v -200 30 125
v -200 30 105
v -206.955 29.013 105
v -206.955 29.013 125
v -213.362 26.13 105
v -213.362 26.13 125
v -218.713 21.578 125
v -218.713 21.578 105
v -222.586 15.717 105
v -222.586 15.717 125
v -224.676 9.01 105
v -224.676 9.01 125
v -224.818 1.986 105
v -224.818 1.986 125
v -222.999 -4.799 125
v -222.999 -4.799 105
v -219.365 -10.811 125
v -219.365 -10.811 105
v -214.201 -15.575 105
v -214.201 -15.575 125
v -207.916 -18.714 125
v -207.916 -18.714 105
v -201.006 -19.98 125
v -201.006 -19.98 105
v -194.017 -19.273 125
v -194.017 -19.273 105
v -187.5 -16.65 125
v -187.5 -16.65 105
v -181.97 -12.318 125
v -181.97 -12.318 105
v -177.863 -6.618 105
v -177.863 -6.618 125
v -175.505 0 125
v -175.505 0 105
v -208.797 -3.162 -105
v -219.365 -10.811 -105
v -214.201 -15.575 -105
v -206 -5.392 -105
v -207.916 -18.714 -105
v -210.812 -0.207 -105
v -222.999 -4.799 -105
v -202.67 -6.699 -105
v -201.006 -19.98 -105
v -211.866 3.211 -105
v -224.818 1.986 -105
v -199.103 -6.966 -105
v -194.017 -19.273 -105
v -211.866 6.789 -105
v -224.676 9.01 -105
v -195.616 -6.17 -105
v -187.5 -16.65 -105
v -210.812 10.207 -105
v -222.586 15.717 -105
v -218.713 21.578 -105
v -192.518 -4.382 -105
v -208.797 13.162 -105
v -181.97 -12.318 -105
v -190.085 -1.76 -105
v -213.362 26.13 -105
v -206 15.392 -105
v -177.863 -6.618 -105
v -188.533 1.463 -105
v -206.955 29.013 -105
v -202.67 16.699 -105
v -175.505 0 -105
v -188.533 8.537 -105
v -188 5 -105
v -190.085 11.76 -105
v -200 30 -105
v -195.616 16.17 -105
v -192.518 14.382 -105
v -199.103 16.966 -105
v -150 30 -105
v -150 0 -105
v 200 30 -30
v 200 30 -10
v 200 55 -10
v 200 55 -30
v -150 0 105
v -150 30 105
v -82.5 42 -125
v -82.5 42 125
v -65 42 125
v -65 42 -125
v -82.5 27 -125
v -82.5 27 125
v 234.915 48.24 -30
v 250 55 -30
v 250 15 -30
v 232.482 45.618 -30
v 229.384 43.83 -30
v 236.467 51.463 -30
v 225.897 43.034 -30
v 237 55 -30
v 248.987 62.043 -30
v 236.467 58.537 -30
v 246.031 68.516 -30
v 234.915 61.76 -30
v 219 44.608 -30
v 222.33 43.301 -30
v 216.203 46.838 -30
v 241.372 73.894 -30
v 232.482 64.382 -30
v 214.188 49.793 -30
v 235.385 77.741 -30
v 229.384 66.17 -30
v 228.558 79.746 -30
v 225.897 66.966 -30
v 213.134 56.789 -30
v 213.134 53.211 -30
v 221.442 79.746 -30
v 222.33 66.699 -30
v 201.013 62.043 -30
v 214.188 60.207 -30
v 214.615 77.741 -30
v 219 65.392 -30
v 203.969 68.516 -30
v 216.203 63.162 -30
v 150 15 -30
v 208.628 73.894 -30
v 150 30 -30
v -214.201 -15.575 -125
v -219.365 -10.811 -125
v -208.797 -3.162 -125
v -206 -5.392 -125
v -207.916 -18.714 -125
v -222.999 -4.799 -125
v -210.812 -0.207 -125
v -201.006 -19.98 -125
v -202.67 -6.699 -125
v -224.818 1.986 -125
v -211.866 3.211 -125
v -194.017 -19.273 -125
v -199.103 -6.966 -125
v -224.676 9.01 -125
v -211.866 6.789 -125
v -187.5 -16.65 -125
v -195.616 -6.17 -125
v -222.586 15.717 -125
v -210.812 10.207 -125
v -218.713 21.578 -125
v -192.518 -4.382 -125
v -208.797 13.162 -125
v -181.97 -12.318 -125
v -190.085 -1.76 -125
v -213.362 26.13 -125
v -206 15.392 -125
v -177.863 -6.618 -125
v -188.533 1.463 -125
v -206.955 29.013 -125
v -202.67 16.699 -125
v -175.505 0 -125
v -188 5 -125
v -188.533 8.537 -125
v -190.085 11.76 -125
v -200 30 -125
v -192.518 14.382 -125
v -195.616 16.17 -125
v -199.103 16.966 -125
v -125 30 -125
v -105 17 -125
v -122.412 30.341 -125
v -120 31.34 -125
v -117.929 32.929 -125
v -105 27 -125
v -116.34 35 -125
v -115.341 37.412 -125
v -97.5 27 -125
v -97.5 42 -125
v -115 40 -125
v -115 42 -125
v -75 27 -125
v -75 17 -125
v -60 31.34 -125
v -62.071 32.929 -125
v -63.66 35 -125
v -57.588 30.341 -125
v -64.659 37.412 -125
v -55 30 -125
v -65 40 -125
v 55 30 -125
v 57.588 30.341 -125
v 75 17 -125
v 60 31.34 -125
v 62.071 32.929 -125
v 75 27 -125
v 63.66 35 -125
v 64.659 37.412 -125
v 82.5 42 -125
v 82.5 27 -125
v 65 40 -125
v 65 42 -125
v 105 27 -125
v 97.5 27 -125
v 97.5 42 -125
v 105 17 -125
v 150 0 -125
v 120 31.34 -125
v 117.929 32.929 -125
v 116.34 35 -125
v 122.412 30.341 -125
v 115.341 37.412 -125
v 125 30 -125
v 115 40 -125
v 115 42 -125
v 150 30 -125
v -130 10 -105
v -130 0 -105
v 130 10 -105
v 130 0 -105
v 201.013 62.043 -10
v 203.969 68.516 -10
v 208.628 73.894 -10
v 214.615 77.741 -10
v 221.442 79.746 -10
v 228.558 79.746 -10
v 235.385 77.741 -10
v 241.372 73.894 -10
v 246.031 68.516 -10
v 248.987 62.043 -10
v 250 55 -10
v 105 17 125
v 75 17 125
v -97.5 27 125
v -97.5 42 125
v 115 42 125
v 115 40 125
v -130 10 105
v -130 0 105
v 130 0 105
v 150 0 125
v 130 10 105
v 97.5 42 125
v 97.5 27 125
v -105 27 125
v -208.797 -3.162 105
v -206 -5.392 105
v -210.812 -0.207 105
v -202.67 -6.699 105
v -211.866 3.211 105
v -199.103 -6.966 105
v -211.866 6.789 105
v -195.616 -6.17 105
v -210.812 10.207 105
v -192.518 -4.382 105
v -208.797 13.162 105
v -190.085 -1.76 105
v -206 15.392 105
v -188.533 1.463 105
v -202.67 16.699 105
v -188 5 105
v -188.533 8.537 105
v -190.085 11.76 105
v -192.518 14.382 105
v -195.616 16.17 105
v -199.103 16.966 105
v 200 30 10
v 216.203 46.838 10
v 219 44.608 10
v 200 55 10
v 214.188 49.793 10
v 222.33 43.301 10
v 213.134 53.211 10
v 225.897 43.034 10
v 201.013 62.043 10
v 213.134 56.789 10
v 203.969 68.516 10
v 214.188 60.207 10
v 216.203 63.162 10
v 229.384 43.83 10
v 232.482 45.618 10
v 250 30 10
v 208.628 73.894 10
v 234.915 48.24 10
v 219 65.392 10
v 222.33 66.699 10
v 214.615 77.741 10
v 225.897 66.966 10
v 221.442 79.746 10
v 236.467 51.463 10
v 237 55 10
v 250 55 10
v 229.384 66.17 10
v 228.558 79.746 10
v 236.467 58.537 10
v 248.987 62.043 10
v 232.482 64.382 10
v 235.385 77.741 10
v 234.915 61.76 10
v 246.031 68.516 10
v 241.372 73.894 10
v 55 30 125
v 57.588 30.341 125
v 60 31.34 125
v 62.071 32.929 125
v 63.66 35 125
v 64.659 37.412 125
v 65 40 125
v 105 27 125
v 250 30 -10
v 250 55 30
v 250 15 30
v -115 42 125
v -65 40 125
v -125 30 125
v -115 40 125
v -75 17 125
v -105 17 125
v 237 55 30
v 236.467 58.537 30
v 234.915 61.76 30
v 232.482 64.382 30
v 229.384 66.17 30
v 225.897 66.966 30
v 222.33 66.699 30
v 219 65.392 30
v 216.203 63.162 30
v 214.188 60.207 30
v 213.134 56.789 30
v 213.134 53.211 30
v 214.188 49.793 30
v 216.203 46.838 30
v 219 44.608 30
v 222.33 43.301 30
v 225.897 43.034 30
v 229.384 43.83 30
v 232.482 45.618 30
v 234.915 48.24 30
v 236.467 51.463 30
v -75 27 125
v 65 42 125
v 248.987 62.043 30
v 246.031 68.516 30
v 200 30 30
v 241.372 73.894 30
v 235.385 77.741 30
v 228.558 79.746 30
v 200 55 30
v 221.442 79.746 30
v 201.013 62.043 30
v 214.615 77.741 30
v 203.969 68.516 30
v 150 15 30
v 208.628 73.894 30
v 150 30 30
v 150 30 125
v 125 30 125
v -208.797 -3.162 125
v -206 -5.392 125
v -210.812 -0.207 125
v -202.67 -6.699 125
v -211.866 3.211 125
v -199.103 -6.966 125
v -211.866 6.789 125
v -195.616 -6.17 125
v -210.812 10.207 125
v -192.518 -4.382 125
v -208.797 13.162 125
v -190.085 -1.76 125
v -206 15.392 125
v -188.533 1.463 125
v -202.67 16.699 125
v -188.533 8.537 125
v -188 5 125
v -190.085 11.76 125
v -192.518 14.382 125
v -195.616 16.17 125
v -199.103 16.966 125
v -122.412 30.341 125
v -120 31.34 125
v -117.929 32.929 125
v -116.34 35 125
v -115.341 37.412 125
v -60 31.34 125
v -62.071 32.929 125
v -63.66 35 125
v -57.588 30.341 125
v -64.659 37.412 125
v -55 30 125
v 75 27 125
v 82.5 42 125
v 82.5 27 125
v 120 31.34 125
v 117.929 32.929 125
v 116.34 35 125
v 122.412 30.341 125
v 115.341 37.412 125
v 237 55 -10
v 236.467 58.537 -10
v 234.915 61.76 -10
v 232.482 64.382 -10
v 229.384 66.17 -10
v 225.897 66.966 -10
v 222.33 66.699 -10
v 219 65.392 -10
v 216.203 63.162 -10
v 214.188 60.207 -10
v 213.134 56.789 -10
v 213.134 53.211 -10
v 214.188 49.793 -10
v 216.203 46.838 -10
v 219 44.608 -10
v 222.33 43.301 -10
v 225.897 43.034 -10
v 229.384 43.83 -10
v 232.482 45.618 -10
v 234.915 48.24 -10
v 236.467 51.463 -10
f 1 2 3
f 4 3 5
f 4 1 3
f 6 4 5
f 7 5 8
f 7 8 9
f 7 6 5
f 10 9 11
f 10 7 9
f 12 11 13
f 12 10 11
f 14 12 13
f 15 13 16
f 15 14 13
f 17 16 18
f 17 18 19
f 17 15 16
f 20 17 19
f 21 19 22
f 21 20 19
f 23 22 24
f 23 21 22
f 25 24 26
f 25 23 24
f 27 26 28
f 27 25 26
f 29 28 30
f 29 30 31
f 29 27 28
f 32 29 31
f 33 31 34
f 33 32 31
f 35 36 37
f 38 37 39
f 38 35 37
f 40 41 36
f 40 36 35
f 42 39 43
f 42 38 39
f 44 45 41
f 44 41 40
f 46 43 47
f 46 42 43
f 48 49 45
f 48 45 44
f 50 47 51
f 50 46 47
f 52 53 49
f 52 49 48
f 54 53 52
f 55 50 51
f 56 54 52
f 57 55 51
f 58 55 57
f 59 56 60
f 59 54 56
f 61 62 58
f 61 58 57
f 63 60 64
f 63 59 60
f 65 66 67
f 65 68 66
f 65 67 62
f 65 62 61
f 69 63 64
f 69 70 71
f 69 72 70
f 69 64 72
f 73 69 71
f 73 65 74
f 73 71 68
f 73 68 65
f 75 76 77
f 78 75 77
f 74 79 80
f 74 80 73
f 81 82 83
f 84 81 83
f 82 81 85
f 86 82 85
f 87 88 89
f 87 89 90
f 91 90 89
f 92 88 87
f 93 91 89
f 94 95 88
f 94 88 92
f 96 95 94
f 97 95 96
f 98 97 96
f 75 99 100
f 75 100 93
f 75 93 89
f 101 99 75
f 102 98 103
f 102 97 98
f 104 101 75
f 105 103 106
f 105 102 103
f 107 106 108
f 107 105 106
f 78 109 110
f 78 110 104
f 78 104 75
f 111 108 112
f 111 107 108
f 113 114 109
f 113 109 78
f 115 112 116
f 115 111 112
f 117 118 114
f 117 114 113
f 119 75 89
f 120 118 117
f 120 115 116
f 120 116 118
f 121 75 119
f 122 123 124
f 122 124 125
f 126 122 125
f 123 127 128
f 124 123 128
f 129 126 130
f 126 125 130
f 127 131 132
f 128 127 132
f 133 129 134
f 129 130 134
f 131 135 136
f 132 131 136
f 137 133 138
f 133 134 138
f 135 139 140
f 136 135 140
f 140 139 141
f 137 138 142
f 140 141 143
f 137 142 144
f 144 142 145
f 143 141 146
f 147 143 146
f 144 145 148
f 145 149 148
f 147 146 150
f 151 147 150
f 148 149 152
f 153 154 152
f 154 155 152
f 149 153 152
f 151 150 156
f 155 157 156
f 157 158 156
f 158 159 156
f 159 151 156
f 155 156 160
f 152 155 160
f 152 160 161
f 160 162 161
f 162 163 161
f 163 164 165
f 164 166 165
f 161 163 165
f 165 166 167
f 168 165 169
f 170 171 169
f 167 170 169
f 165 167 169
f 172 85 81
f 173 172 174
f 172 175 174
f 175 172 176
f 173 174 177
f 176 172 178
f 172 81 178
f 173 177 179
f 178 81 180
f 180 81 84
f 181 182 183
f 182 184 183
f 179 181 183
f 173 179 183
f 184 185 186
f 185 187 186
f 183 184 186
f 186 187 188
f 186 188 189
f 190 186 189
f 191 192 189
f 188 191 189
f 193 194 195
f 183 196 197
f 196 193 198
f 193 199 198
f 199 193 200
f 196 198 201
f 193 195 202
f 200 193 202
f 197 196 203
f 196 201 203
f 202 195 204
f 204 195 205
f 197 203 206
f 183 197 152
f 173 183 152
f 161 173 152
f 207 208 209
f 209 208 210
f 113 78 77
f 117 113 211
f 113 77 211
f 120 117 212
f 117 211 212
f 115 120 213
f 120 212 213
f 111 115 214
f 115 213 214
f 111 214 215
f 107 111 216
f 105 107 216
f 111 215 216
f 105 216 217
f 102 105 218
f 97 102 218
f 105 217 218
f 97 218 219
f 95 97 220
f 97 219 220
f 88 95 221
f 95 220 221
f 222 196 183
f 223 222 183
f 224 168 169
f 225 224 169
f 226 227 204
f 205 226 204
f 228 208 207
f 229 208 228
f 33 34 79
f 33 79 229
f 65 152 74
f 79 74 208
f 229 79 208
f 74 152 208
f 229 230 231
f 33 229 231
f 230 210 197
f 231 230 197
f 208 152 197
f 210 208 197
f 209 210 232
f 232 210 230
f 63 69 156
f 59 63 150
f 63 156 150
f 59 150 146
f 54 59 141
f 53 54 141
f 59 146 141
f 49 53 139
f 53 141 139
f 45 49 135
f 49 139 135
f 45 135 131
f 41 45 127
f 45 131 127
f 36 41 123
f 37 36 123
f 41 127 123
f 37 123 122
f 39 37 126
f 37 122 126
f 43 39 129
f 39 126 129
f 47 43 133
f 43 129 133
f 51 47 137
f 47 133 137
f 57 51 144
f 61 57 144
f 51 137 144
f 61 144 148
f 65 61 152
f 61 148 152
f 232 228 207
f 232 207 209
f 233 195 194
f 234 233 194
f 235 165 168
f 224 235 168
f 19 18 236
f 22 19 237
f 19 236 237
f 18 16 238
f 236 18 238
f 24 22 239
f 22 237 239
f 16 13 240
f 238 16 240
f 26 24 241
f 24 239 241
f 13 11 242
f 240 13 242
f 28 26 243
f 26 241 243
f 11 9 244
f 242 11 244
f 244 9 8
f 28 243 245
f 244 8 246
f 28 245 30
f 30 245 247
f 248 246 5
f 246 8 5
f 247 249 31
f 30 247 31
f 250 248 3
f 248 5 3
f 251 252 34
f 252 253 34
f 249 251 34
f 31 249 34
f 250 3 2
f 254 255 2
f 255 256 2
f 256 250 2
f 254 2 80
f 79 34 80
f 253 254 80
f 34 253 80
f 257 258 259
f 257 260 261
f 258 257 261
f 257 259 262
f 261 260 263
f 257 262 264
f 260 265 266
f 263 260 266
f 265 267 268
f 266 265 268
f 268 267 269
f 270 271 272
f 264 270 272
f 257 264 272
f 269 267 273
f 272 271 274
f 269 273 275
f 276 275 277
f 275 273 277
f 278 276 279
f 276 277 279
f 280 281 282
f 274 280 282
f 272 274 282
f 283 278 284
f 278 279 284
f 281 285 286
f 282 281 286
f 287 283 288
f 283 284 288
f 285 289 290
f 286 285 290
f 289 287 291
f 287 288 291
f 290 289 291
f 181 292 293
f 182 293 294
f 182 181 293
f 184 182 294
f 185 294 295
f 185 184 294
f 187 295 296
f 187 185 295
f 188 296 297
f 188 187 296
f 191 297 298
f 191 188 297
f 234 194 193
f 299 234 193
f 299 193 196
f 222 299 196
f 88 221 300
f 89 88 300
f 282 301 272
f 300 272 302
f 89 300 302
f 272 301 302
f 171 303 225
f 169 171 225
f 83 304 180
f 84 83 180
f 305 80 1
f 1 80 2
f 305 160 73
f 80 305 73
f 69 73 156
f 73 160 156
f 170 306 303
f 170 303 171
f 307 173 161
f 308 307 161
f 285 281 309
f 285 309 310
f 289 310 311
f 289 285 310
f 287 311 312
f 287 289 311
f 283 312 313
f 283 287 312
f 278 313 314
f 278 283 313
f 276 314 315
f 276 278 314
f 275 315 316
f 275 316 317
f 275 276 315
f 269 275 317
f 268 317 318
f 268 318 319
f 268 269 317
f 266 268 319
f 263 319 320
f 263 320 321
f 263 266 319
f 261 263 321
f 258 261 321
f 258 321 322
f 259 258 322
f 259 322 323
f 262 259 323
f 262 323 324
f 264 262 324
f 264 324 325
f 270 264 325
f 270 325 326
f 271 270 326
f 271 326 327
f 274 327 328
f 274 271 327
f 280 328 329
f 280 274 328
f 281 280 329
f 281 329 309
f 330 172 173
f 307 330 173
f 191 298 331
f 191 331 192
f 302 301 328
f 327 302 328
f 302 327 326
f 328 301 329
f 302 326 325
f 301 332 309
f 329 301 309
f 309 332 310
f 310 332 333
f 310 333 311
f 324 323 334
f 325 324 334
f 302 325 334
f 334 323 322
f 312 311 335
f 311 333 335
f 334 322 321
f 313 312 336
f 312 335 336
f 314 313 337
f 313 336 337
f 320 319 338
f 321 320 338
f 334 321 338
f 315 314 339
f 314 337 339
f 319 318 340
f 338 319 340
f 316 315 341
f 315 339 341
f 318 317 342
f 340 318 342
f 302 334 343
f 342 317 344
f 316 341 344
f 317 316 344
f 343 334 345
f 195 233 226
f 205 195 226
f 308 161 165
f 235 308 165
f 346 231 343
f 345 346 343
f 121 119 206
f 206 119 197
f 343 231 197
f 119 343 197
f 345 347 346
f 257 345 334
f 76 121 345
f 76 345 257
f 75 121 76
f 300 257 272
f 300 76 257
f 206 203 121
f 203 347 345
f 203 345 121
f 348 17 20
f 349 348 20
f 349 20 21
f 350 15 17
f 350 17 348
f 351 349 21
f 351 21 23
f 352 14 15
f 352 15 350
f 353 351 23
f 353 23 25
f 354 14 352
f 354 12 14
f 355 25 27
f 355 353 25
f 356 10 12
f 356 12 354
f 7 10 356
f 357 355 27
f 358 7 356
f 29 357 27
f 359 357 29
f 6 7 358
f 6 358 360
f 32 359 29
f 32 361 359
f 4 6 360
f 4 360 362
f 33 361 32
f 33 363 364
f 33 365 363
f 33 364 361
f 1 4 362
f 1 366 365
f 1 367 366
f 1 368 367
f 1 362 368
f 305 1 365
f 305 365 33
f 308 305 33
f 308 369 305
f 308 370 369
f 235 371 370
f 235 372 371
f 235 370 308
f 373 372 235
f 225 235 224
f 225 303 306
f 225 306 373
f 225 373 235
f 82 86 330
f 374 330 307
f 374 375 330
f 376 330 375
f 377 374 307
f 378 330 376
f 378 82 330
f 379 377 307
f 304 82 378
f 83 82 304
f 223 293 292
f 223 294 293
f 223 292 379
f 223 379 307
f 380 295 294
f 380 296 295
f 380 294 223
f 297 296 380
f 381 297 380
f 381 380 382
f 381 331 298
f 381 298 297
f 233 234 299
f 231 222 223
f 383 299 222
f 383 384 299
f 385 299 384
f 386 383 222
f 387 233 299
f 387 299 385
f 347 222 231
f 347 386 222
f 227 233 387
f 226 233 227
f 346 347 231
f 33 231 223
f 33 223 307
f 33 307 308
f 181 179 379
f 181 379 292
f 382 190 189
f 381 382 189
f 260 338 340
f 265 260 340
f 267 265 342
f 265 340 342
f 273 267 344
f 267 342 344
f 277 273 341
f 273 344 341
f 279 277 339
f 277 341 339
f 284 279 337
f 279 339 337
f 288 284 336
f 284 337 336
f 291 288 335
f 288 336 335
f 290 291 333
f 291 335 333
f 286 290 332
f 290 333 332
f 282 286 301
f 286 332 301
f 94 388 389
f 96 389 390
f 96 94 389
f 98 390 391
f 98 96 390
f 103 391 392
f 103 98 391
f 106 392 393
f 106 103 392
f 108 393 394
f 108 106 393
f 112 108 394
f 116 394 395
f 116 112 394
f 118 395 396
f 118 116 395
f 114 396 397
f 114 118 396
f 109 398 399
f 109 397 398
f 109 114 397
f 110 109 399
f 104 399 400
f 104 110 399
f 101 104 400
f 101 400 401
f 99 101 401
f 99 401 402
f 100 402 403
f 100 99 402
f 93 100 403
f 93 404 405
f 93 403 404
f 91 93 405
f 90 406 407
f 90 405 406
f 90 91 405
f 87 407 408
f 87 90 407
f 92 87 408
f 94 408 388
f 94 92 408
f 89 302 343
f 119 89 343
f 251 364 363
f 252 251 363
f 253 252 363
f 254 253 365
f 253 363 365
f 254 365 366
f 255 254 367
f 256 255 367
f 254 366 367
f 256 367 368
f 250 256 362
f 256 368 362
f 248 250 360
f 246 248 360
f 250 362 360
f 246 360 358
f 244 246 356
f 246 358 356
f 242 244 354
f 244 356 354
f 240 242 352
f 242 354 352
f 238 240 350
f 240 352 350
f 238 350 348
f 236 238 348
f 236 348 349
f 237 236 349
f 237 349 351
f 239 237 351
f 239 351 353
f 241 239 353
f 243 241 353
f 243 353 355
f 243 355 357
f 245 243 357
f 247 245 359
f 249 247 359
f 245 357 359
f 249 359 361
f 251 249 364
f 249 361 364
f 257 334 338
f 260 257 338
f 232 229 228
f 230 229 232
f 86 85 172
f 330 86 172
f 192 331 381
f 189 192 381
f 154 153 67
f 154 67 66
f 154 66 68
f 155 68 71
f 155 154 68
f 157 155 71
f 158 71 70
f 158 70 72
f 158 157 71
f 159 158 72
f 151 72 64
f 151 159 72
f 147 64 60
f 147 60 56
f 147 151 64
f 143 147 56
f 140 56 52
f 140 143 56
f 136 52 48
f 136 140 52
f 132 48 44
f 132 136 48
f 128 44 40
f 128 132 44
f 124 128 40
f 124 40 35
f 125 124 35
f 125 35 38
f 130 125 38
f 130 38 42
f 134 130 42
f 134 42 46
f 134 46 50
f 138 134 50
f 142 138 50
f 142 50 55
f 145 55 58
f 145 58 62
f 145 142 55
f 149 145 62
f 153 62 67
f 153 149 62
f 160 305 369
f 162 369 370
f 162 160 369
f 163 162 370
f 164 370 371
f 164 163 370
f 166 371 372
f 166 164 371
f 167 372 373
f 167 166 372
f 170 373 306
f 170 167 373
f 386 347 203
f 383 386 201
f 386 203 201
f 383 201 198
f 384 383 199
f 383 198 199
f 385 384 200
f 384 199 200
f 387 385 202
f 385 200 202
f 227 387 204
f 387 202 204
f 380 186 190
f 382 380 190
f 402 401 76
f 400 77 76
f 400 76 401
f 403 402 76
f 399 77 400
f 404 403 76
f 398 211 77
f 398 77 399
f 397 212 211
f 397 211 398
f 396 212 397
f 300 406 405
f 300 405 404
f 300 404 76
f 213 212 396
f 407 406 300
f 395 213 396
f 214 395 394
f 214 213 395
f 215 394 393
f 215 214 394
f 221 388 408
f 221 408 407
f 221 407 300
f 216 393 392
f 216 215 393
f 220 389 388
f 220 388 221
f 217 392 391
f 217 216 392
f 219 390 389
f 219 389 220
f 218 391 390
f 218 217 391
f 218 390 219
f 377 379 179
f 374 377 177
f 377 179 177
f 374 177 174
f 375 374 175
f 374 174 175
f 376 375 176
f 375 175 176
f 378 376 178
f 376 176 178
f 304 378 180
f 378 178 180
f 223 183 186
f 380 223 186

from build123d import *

# Parameters (mm, degrees)
ESBO_O1_W                         = 300
ESBO_O1_H                         = 250
RESSALTO_EXTRUS_O1_DEPTH          = 30
ESBO_O3_W                         = 50
ESBO_O3_H                         = 250
RESSALTO_EXTRUS_O2_DEPTH          = 12
FILETE1_R                         = 10
CORTE_EXTRUS_O1_REACH             = 127
CORTE_EXTRUS_O1_DIRECTION_2_REACH = 127
ESBO_O5_R                         = 12
RESSALTO_EXTRUS_O3_DEPTH          = 30
ESBO_O6_W                         = 60.214883571
ESBO_O6_H                         = 66.59752961
CORTE_EXTRUS_O2_DEPTH             = 10
ESBO_O7_R                         = 12
RESSALTO_EXTRUS_O4_DEPTH          = 20
ESBO_O8_W                         = 260
ESBO_O8_H                         = 210
CORTE_EXTRUS_O3_DEPTH             = 10


with BuildPart() as part:
    # Esboço1 → Ressalto-extrusão1 (new body)
    with BuildSketch(Plane(origin=(0, 0, 0), x_dir=(1, 0, 0), z_dir=(0, 1, 0))):
        Rectangle(ESBO_O1_W, ESBO_O1_H)
    extrude(amount=RESSALTO_EXTRUS_O1_DEPTH)

    # Esboço3 → Ressalto-extrusão2 (add)
    with BuildSketch(Plane(origin=(0, 30, 0), x_dir=(1, 0, 0), z_dir=(0, 1, 0))):
        with Locations((90, 0)):
            Rectangle(ESBO_O3_W, ESBO_O3_H)
        with Locations((-90, 0)):
            Rectangle(ESBO_O3_W, ESBO_O3_H)
    extrude(amount=RESSALTO_EXTRUS_O2_DEPTH)

    # Filete1
    filete1_edges = [part.edges().sort_by_distance(p)[0] for p in [
        (-115, 30, 0),
        (-65, 30, 0),
        (65, 30, 0),
        (115, 30, 0),
    ]]
    fillet(filete1_edges, radius=FILETE1_R)

    # Esboço4 → Corte-extrusão1 (cut, up to next)
    with BuildSketch(Plane.XY, mode=Mode.PRIVATE) as corte_extrus_o1_sk1:
        Polygon((82.5, 42), (97.5, 42), (97.5, 27), (105, 27), (105, 17), (75, 17), (75, 27), (82.5, 27), align=None)
    corte_extrus_o1_tool1 = extrude(corte_extrus_o1_sk1.sketch, amount=-CORTE_EXTRUS_O1_REACH, mode=Mode.PRIVATE) & part.part
    add(corte_extrus_o1_tool1.solids().sort_by_distance((90, 27.357143, 0))[0], mode=Mode.SUBTRACT)
    # Esboço4 → Corte-extrusão1 (cut, up to next)
    with BuildSketch(Plane.XY, mode=Mode.PRIVATE) as corte_extrus_o1_sk2:
        Polygon((-82.5, 42), (-82.5, 27), (-75, 27), (-75, 17), (-105, 17), (-105, 27), (-97.5, 27), (-97.5, 42), align=None)
    corte_extrus_o1_tool2 = extrude(corte_extrus_o1_sk2.sketch, amount=-CORTE_EXTRUS_O1_REACH, mode=Mode.PRIVATE) & part.part
    add(corte_extrus_o1_tool2.solids().sort_by_distance((-90, 27.357143, 0))[0], mode=Mode.SUBTRACT)

    # Esboço4 → Corte-extrusão1 direction 2 (cut, up to next)
    with BuildSketch(Plane.XY, mode=Mode.PRIVATE) as corte_extrus_o1_direction_2_sk1:
        Polygon((82.5, 42), (97.5, 42), (97.5, 27), (105, 27), (105, 17), (75, 17), (75, 27), (82.5, 27), align=None)
    corte_extrus_o1_direction_2_tool1 = extrude(corte_extrus_o1_direction_2_sk1.sketch, amount=CORTE_EXTRUS_O1_DIRECTION_2_REACH, mode=Mode.PRIVATE) & part.part
    add(corte_extrus_o1_direction_2_tool1.solids().sort_by_distance((90, 27.357143, 0))[0], mode=Mode.SUBTRACT)
    # Esboço4 → Corte-extrusão1 direction 2 (cut, up to next)
    with BuildSketch(Plane.XY, mode=Mode.PRIVATE) as corte_extrus_o1_direction_2_sk2:
        Polygon((-82.5, 42), (-82.5, 27), (-75, 27), (-75, 17), (-105, 17), (-105, 27), (-97.5, 27), (-97.5, 42), align=None)
    corte_extrus_o1_direction_2_tool2 = extrude(corte_extrus_o1_direction_2_sk2.sketch, amount=CORTE_EXTRUS_O1_DIRECTION_2_REACH, mode=Mode.PRIVATE) & part.part
    add(corte_extrus_o1_direction_2_tool2.solids().sort_by_distance((-90, 27.357143, 0))[0], mode=Mode.SUBTRACT)

    # Esboço5 → Ressalto-extrusão3 (add, symmetric)
    with BuildSketch(Plane.XY):
        with BuildLine():
            Line((150, 30), (200, 30))
            Line((200, 30), (200, 55))
            ThreePointArc((200, 55), (225, 80), (250, 55))
            Line((250, 55), (250, 15))
            Line((250, 15), (150, 15))
            Line((150, 15), (150, 30))
        make_face()
        with Locations((225, 55)):
            Circle(ESBO_O5_R, mode=Mode.SUBTRACT)
    extrude(amount=RESSALTO_EXTRUS_O3_DEPTH, both=True)

    # Esboço6 → Corte-extrusão2 (cut, symmetric)
    with BuildSketch(Plane.XY):
        with Locations((230.107441786, 63.298764805)):
            Rectangle(ESBO_O6_W, ESBO_O6_H)
    extrude(amount=CORTE_EXTRUS_O2_DEPTH, both=True, mode=Mode.SUBTRACT)

    # Esboço7 → Ressalto-extrusão4 (add)
    with BuildSketch(Plane.XY.offset(125)):
        with BuildLine():
            Line((-150, 30), (-200, 30))
            ThreePointArc((-200, 30), (-219.364916731, -10.811388301), (-175.505102572, 0))
            Line((-175.505102572, 0), (-150, 0))
            Line((-150, 0), (-150, 30))
        make_face()
        with Locations((-200, 5)):
            Circle(ESBO_O7_R, mode=Mode.SUBTRACT)
    ressalto_extrus_o4 = extrude(amount=-RESSALTO_EXTRUS_O4_DEPTH)

    # Espelhar1: Ressalto-extrusão4 across plane
    add(ressalto_extrus_o4.mirror(Plane.XY))

    # Esboço8 → Corte-extrusão3 (cut)
    with BuildSketch(Plane.XZ):
        Rectangle(ESBO_O8_W, ESBO_O8_H)
    extrude(amount=-CORTE_EXTRUS_O3_DEPTH, mode=Mode.SUBTRACT)


solid = part.part
